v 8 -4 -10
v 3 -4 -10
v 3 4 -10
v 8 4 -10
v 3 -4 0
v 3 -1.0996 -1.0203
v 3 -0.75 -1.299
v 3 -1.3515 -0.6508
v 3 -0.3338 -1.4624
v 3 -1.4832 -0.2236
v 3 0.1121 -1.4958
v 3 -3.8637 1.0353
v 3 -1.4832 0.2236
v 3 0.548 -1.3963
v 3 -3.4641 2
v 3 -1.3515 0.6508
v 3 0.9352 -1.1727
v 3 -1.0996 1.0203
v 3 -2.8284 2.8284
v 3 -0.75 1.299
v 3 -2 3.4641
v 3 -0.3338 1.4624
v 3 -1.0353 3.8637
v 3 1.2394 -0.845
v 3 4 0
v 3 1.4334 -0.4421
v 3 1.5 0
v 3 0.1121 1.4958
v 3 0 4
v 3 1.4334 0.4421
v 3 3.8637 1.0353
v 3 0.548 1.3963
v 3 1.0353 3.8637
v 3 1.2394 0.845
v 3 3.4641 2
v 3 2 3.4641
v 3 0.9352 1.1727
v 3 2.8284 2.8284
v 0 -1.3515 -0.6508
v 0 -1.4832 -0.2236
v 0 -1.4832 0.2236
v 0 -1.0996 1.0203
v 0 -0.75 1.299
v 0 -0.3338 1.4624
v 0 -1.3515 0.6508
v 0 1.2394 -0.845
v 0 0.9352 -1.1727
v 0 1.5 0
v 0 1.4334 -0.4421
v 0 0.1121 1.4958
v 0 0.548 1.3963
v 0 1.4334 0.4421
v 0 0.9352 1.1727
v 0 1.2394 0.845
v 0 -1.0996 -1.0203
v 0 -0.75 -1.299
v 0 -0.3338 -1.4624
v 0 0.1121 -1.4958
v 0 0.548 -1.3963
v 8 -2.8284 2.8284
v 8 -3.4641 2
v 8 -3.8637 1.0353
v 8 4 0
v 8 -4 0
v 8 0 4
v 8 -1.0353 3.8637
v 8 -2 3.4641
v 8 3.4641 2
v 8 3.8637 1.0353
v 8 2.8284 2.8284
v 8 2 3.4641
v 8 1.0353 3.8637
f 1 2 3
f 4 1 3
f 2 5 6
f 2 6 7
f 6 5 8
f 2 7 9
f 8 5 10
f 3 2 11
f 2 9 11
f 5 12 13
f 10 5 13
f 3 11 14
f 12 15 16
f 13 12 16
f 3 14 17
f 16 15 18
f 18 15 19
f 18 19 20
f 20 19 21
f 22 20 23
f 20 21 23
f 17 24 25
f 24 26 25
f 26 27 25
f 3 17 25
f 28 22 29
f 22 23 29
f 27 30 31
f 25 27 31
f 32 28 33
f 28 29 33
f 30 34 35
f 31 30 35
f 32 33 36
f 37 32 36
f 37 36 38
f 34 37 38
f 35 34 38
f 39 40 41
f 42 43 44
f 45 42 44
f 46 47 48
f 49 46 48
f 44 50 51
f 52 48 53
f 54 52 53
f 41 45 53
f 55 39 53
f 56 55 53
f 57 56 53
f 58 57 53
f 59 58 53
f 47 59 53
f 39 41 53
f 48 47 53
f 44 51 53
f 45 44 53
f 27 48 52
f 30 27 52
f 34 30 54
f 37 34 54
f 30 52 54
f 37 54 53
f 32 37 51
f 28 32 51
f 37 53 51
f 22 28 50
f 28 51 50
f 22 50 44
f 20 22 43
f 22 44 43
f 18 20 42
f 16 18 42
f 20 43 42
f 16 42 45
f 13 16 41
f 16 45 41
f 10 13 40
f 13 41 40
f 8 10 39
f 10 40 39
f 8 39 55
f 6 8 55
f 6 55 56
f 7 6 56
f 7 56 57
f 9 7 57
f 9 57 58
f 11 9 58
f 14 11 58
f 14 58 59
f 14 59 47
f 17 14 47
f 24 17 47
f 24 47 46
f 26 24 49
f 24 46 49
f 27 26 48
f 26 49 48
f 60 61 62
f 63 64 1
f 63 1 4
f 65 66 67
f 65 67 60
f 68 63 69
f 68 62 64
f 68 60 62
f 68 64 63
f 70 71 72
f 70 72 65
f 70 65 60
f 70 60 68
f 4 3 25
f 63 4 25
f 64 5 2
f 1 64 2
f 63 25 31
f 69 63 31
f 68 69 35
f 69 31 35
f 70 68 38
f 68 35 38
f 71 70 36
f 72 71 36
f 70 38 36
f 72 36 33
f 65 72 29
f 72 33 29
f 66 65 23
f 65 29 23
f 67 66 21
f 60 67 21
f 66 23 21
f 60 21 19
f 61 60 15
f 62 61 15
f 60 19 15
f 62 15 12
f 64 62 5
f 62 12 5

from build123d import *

# Parameters (mm, degrees)
F0_R     = 1.5
F1_DEPTH = 3
F3_DEPTH = 5


with BuildPart() as f1:
    # F0 (on Right) → F1 (new body)
    with BuildSketch(Plane.YZ):
        Circle(F0_R)
    extrude(amount=F1_DEPTH)

    # F2 (on face) → F3 (join)
    with BuildSketch(Plane.YZ.offset(3)):
        with BuildLine():
            Line((4, -10), (4, 0))
            ThreePointArc((4, 0), (0, 4), (-4, 0))
            Line((-4, 0), (-4, -10))
            Line((-4, -10), (4, -10))
        make_face()
    extrude(amount=F3_DEPTH)


solid = f1.part
